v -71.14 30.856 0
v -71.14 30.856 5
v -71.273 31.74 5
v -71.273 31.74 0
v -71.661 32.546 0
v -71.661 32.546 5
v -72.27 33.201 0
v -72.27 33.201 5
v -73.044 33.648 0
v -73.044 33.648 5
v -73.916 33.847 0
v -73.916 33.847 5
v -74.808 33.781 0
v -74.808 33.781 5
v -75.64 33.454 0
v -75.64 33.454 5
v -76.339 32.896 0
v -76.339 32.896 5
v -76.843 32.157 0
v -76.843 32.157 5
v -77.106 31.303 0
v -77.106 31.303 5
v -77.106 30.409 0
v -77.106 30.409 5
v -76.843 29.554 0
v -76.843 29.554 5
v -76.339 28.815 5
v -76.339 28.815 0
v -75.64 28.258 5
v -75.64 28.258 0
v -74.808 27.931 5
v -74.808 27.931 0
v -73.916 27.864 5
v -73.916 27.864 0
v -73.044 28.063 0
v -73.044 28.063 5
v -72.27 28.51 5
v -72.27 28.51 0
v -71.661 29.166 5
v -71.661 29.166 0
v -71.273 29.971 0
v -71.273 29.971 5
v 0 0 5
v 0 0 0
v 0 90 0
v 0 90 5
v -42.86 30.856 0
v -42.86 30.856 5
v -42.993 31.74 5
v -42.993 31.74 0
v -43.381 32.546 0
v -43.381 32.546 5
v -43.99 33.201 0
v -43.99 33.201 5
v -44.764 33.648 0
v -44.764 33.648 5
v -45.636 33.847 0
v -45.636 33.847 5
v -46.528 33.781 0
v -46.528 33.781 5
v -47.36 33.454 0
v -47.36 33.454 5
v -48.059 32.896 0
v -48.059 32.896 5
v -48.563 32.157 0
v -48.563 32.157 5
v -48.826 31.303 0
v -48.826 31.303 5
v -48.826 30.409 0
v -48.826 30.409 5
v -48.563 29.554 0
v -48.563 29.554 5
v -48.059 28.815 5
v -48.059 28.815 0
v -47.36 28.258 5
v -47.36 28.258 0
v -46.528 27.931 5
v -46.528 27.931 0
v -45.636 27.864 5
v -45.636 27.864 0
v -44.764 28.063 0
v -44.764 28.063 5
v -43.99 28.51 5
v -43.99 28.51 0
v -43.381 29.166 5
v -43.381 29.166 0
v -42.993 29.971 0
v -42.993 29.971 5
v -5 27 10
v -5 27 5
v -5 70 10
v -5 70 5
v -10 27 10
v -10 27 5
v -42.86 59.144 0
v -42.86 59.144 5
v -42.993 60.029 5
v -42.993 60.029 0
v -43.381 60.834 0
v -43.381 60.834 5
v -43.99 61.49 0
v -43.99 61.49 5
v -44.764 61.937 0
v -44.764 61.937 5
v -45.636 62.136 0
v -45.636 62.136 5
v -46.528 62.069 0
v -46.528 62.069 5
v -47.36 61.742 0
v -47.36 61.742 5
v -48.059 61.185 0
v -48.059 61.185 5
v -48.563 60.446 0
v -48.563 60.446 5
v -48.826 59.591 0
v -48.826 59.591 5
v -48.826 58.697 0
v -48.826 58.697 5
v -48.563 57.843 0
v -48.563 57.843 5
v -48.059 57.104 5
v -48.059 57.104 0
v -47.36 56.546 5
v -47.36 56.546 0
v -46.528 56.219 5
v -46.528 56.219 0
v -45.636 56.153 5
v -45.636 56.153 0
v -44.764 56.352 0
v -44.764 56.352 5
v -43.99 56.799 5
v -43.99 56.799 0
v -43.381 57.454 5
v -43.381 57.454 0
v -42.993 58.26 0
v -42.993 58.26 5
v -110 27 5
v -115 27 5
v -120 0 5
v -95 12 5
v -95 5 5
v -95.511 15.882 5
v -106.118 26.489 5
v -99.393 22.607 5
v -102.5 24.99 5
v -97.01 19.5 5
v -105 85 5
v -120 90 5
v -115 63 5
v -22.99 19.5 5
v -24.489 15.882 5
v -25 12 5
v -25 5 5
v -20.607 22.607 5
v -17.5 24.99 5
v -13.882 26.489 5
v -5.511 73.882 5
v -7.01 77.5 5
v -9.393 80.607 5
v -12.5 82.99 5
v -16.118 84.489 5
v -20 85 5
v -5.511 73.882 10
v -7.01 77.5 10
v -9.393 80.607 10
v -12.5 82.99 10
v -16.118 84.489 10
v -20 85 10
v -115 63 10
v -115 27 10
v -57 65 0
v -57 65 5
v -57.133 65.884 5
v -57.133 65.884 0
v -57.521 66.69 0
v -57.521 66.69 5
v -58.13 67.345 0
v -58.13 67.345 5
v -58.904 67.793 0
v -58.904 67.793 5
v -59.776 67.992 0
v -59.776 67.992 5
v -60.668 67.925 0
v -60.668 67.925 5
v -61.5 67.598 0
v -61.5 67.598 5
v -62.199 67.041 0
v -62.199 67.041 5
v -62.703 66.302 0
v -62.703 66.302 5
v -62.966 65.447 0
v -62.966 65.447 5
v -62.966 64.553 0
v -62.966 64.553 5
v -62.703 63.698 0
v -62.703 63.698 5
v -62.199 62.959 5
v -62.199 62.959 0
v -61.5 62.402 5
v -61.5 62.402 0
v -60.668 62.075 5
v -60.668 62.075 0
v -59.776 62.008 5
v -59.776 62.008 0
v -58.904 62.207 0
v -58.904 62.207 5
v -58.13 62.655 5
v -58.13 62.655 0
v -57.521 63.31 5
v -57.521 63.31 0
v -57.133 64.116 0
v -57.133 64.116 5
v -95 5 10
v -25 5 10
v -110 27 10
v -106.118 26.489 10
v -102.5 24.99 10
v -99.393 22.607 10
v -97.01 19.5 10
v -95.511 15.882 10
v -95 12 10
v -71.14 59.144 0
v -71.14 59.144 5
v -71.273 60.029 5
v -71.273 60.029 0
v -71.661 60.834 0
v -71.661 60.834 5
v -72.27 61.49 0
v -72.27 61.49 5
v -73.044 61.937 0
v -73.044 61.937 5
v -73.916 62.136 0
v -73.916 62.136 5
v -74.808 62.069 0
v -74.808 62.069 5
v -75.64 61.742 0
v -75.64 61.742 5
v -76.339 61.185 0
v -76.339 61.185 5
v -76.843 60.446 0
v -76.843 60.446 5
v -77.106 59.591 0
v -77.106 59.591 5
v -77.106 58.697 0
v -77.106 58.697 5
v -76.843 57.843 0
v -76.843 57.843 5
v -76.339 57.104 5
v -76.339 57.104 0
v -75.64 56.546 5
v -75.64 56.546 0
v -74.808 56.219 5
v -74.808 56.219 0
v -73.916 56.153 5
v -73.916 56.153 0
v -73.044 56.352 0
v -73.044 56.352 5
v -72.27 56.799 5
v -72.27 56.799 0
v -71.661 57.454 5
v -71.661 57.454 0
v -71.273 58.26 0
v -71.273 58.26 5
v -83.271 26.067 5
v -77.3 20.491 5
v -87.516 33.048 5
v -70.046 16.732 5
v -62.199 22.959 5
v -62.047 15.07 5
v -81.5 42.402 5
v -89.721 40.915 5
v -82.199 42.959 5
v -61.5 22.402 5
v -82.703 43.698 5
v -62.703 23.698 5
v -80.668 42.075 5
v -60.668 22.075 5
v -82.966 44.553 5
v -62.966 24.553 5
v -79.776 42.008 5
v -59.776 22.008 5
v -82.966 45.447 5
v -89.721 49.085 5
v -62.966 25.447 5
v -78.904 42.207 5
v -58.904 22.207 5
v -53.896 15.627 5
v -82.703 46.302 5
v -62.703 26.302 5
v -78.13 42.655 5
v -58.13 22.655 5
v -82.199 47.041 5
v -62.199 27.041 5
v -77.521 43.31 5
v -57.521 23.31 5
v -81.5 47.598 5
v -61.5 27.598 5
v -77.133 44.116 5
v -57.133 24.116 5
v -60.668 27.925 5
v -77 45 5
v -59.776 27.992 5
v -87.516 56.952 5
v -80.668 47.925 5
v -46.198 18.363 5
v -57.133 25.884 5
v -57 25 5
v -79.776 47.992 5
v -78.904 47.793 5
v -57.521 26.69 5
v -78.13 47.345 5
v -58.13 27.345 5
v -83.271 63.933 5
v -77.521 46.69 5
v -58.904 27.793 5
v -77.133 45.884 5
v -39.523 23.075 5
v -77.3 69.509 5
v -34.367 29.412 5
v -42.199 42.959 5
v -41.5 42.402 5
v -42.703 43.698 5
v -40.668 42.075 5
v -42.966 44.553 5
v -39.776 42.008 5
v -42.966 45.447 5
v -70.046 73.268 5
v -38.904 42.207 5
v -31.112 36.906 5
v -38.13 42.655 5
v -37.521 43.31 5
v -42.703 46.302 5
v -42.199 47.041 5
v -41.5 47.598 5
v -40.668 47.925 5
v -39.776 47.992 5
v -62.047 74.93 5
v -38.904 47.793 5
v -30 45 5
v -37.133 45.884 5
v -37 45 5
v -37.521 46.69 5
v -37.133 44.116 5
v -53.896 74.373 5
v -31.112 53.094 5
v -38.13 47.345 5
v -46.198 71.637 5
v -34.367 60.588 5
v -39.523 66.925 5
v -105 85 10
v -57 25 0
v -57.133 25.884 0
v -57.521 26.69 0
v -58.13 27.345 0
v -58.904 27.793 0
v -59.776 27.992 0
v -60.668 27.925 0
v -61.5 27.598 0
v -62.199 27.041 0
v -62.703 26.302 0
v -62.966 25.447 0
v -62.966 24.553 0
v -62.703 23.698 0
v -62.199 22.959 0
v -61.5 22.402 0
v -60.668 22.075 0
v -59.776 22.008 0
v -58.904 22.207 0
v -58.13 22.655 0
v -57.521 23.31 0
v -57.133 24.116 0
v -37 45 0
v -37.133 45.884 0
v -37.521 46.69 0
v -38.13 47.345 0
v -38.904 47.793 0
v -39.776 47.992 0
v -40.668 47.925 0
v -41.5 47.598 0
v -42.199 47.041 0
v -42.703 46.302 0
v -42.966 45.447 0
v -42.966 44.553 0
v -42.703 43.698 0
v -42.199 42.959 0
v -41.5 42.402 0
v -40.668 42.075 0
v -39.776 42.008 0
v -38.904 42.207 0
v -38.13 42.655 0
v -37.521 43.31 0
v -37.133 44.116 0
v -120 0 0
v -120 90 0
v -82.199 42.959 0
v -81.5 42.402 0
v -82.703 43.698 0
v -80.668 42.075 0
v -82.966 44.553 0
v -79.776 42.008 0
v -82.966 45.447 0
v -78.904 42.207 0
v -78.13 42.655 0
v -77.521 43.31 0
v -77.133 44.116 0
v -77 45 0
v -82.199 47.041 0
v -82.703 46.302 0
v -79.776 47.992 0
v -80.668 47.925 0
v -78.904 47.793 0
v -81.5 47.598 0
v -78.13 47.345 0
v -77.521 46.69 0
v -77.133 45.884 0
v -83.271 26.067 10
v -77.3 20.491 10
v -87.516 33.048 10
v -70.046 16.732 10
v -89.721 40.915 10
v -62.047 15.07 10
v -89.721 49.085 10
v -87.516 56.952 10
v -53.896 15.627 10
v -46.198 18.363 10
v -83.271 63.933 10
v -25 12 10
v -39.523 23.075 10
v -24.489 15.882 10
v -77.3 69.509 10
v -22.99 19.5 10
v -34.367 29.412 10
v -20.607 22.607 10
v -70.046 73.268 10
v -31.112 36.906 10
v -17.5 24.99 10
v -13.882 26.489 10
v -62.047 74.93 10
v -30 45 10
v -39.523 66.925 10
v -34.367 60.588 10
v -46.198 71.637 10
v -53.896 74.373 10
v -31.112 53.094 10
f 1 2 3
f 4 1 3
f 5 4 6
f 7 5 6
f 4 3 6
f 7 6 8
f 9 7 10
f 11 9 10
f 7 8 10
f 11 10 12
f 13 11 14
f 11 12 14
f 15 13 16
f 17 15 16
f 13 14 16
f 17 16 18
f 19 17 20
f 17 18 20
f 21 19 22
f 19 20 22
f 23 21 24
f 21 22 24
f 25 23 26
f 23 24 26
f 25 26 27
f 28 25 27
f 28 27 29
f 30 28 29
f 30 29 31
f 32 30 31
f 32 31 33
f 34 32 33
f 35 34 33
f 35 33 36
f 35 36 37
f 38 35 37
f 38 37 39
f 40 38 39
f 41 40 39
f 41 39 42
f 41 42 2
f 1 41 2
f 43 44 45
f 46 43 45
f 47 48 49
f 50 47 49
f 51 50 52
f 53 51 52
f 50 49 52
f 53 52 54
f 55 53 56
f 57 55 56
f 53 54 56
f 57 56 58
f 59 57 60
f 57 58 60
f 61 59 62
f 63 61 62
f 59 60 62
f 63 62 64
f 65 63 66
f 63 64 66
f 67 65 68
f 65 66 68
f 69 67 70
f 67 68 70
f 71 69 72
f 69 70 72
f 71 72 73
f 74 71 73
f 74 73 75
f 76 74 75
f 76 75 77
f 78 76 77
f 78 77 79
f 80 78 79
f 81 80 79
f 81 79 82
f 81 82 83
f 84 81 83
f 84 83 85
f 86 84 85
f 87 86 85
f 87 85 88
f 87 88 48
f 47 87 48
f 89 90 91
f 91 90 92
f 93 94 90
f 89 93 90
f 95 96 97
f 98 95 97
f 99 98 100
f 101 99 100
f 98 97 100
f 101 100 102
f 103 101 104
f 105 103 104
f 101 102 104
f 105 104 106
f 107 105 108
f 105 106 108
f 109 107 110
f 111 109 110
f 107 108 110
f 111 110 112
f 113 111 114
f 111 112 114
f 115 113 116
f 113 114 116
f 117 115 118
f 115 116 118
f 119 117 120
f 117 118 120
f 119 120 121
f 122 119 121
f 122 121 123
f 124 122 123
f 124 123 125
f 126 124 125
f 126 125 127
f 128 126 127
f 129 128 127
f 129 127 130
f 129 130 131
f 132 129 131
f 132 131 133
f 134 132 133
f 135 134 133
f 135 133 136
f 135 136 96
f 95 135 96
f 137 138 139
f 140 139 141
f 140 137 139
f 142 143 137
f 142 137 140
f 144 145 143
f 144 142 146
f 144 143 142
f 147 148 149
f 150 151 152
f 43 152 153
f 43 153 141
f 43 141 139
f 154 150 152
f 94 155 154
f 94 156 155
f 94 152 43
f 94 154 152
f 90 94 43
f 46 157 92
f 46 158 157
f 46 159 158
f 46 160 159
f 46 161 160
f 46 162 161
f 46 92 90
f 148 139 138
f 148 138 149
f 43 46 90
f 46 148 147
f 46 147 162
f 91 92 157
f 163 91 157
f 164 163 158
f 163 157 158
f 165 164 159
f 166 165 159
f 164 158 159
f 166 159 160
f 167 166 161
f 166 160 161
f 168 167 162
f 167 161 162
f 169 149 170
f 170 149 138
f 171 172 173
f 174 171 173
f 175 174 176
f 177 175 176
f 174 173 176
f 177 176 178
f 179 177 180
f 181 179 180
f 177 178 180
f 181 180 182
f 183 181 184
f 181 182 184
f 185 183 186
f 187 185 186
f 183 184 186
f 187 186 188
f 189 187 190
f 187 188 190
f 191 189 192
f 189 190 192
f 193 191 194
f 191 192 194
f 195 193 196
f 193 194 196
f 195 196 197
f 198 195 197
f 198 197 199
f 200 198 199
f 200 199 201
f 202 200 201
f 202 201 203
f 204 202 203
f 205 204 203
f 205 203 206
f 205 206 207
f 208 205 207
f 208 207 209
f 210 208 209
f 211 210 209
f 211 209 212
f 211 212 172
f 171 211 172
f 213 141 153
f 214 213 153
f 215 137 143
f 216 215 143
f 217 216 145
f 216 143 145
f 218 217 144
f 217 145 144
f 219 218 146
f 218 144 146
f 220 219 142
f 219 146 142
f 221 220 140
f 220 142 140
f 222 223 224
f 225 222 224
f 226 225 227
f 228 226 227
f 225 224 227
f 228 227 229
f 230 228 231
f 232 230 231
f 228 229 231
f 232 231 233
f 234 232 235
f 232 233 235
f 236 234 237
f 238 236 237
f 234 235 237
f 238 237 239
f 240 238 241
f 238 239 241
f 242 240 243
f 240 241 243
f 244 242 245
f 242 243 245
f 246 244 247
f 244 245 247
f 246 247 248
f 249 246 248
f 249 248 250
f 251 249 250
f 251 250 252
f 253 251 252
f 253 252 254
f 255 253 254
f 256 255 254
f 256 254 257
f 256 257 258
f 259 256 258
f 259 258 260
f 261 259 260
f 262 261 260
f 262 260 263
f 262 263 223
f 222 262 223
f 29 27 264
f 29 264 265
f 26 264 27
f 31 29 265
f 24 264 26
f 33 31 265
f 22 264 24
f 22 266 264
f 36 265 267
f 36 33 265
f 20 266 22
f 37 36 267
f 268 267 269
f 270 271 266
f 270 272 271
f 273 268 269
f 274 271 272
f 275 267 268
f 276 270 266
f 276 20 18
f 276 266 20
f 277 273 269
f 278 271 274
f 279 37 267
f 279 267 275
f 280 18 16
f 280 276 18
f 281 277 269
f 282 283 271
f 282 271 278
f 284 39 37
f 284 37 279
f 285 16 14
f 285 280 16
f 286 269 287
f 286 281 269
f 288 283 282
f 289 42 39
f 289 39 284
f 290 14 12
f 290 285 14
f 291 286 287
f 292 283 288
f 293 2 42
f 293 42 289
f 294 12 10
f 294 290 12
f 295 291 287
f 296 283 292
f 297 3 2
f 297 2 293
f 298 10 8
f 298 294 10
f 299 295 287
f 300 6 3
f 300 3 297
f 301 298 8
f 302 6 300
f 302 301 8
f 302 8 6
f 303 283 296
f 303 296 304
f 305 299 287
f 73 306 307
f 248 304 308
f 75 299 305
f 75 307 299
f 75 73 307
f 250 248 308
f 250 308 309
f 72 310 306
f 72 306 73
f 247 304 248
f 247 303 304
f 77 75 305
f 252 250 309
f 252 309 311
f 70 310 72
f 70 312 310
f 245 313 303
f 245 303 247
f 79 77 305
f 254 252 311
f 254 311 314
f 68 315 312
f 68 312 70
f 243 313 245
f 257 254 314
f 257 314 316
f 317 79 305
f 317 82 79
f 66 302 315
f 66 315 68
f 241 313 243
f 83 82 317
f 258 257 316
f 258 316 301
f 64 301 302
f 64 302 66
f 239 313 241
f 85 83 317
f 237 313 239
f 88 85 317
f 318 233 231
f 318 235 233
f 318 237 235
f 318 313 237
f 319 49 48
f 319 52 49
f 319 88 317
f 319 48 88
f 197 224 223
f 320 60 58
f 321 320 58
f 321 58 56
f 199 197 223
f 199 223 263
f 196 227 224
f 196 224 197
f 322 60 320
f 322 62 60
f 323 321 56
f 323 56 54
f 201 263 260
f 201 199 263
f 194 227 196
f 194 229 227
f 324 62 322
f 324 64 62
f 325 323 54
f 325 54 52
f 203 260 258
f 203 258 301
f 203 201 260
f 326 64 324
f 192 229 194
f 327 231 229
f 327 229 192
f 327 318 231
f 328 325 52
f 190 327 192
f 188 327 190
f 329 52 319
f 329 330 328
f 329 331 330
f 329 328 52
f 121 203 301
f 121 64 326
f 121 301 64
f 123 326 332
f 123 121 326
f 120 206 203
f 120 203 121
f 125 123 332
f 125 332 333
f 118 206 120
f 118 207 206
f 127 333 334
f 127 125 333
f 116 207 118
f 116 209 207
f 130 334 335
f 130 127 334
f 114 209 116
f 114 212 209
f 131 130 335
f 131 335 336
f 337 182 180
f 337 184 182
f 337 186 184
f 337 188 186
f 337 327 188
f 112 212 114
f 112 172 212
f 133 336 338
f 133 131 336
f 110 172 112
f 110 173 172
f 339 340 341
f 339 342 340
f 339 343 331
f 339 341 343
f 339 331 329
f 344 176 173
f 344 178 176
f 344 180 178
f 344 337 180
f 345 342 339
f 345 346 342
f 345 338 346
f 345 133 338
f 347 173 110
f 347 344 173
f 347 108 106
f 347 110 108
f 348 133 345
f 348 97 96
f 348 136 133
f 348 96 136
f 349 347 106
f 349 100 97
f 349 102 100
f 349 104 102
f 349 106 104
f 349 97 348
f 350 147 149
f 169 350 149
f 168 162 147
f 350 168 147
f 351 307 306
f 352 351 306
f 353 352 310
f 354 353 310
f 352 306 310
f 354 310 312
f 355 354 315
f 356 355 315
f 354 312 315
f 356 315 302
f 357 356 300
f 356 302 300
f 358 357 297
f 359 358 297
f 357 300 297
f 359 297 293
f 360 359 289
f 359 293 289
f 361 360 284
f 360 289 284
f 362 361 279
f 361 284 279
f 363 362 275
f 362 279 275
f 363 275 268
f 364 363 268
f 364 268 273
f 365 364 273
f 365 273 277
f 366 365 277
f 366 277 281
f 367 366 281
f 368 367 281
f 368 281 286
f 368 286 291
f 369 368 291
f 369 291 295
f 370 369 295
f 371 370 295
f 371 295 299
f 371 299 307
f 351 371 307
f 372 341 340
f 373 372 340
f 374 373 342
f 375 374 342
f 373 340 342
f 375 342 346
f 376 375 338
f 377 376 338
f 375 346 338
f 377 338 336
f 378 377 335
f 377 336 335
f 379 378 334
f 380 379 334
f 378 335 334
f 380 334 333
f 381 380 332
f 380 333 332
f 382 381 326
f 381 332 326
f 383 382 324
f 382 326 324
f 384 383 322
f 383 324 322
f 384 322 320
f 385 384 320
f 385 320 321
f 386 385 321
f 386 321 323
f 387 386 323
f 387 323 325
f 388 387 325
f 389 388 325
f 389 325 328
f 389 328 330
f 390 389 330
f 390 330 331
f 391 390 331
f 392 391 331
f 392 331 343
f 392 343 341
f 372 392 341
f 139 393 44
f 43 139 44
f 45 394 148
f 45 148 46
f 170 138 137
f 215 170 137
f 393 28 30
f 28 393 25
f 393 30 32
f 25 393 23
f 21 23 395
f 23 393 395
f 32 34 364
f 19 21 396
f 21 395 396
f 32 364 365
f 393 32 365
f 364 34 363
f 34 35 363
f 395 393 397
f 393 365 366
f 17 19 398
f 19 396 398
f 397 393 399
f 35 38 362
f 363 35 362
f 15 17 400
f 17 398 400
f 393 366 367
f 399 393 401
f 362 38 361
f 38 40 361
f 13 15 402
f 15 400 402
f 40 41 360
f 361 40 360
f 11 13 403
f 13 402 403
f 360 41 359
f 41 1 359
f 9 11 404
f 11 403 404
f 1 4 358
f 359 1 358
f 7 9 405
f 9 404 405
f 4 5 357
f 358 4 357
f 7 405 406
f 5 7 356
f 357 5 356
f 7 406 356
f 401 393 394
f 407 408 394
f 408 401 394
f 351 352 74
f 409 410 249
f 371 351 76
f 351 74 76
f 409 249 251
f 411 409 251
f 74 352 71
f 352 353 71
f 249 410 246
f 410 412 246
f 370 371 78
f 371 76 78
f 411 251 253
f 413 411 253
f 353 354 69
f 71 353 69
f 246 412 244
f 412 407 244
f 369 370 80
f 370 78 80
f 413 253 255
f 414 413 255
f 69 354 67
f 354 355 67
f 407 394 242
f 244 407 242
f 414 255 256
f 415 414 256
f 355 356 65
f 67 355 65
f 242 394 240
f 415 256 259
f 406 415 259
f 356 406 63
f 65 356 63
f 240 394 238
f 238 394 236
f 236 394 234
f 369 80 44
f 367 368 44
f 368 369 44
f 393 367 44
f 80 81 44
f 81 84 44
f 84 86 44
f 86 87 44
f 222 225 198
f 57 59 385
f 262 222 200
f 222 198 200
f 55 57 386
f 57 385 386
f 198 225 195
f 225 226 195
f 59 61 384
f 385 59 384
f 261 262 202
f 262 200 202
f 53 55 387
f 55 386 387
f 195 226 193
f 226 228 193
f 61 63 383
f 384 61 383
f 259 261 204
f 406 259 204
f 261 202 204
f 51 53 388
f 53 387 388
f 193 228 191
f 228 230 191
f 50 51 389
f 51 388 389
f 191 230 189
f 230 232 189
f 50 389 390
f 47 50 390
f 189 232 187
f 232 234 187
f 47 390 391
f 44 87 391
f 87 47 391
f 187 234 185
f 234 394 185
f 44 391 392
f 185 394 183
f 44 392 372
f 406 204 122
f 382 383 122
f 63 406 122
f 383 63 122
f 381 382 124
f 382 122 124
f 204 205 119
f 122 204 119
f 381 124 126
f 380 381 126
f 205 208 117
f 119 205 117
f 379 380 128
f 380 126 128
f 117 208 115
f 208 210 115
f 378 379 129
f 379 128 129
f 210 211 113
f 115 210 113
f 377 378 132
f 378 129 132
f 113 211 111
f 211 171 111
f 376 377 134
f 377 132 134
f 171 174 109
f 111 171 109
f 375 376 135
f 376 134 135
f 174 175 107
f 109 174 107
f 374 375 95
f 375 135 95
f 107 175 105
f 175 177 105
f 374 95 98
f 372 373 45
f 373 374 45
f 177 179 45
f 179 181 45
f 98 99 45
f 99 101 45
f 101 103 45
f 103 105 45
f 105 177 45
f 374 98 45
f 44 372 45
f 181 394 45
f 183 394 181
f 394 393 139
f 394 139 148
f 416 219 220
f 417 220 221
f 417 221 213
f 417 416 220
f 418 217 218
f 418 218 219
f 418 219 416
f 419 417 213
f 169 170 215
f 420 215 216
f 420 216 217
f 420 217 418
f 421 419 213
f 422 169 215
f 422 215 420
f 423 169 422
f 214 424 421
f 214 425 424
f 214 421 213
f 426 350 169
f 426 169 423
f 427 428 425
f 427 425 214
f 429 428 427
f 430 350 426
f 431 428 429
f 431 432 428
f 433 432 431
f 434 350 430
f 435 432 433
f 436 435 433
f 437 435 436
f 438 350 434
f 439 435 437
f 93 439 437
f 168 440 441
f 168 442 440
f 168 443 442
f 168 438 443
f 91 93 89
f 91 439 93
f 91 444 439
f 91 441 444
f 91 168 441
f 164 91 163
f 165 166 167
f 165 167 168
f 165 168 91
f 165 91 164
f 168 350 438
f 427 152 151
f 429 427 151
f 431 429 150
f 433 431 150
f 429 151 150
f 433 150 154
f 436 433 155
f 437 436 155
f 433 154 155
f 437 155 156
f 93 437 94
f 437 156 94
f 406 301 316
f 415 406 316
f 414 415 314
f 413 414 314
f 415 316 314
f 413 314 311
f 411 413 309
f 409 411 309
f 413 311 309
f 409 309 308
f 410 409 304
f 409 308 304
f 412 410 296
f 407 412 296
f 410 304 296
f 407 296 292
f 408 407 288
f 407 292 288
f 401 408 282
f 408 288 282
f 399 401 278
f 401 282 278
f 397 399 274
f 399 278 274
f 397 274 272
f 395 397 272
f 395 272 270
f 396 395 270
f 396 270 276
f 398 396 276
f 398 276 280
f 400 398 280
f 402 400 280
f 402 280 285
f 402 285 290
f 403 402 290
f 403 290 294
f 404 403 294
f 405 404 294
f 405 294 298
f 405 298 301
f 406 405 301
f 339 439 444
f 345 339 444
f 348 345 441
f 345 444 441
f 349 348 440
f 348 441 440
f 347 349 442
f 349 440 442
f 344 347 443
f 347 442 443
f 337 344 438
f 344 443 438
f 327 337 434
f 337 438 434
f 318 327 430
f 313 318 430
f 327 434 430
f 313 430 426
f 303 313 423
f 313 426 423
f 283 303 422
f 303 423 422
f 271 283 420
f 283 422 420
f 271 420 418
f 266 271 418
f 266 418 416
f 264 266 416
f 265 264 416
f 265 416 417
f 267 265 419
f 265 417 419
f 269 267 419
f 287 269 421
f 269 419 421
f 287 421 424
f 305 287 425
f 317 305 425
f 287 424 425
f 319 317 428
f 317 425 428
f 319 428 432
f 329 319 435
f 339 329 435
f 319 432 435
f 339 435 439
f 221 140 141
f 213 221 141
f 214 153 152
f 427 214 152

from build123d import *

# Parameters (mm, degrees)
F0_W     = 120
F0_H     = 90
F1_DEPTH = 5
F3_DEPTH = 5
F4_R     = 30
F5_DEPTH = 5
F6_R     = 3
F7_DEPTH = 25


with BuildPart() as f1:
    # F0 (on Top) → F1 (new body)
    with BuildSketch(Plane.XY):
        with Locations((-60, 45)):
            Rectangle(F0_W, F0_H)
    extrude(amount=F1_DEPTH)

    # F2 (on face) → F3 (join)
    with BuildSketch(Plane.XY.offset(5)):
        with BuildLine():
            Line((-10, 27), (-5, 27))
            Line((-5, 27), (-5, 70))
            ThreePointArc((-5, 70), (-9.393398, 80.606602), (-20, 85))
            Line((-20, 85), (-105, 85))
            Line((-105, 85), (-115, 63))
            Line((-115, 63), (-115, 27))
            Line((-115, 27), (-110, 27))
            ThreePointArc((-110, 27), (-99.393398, 22.606602), (-95, 12))
            Line((-95, 12), (-95, 5))
            Line((-95, 5), (-25, 5))
            Line((-25, 5), (-25, 12))
            ThreePointArc((-25, 12), (-20.606602, 22.606602), (-10, 27))
        make_face()
    extrude(amount=F3_DEPTH)

    # F4 (on face) → F5 (cut)
    with BuildSketch(Plane.XY.offset(10)):
        with Locations((-60, 45)):
            Circle(F4_R)
    extrude(amount=-F5_DEPTH, mode=Mode.SUBTRACT)

    # F6 (on face) → F7 (cut)
    with BuildSketch(Plane.XY.offset(10)):
        with Locations((-80, 45)):
            Circle(F6_R)
        with Locations((-60, 25)):
            Circle(F6_R)
        with Locations((-60, 65)):
            Circle(F6_R)
        with Locations((-40, 45)):
            Circle(F6_R)
        with Locations((-74.14, 59.144271)):
            Circle(F6_R)
        with Locations((-45.86, 59.144271)):
            Circle(F6_R)
        with Locations((-74.14, 30.855729)):
            Circle(F6_R)
        with Locations((-45.86, 30.855729)):
            Circle(F6_R)
    extrude(amount=-F7_DEPTH, mode=Mode.SUBTRACT)


solid = f1.part
